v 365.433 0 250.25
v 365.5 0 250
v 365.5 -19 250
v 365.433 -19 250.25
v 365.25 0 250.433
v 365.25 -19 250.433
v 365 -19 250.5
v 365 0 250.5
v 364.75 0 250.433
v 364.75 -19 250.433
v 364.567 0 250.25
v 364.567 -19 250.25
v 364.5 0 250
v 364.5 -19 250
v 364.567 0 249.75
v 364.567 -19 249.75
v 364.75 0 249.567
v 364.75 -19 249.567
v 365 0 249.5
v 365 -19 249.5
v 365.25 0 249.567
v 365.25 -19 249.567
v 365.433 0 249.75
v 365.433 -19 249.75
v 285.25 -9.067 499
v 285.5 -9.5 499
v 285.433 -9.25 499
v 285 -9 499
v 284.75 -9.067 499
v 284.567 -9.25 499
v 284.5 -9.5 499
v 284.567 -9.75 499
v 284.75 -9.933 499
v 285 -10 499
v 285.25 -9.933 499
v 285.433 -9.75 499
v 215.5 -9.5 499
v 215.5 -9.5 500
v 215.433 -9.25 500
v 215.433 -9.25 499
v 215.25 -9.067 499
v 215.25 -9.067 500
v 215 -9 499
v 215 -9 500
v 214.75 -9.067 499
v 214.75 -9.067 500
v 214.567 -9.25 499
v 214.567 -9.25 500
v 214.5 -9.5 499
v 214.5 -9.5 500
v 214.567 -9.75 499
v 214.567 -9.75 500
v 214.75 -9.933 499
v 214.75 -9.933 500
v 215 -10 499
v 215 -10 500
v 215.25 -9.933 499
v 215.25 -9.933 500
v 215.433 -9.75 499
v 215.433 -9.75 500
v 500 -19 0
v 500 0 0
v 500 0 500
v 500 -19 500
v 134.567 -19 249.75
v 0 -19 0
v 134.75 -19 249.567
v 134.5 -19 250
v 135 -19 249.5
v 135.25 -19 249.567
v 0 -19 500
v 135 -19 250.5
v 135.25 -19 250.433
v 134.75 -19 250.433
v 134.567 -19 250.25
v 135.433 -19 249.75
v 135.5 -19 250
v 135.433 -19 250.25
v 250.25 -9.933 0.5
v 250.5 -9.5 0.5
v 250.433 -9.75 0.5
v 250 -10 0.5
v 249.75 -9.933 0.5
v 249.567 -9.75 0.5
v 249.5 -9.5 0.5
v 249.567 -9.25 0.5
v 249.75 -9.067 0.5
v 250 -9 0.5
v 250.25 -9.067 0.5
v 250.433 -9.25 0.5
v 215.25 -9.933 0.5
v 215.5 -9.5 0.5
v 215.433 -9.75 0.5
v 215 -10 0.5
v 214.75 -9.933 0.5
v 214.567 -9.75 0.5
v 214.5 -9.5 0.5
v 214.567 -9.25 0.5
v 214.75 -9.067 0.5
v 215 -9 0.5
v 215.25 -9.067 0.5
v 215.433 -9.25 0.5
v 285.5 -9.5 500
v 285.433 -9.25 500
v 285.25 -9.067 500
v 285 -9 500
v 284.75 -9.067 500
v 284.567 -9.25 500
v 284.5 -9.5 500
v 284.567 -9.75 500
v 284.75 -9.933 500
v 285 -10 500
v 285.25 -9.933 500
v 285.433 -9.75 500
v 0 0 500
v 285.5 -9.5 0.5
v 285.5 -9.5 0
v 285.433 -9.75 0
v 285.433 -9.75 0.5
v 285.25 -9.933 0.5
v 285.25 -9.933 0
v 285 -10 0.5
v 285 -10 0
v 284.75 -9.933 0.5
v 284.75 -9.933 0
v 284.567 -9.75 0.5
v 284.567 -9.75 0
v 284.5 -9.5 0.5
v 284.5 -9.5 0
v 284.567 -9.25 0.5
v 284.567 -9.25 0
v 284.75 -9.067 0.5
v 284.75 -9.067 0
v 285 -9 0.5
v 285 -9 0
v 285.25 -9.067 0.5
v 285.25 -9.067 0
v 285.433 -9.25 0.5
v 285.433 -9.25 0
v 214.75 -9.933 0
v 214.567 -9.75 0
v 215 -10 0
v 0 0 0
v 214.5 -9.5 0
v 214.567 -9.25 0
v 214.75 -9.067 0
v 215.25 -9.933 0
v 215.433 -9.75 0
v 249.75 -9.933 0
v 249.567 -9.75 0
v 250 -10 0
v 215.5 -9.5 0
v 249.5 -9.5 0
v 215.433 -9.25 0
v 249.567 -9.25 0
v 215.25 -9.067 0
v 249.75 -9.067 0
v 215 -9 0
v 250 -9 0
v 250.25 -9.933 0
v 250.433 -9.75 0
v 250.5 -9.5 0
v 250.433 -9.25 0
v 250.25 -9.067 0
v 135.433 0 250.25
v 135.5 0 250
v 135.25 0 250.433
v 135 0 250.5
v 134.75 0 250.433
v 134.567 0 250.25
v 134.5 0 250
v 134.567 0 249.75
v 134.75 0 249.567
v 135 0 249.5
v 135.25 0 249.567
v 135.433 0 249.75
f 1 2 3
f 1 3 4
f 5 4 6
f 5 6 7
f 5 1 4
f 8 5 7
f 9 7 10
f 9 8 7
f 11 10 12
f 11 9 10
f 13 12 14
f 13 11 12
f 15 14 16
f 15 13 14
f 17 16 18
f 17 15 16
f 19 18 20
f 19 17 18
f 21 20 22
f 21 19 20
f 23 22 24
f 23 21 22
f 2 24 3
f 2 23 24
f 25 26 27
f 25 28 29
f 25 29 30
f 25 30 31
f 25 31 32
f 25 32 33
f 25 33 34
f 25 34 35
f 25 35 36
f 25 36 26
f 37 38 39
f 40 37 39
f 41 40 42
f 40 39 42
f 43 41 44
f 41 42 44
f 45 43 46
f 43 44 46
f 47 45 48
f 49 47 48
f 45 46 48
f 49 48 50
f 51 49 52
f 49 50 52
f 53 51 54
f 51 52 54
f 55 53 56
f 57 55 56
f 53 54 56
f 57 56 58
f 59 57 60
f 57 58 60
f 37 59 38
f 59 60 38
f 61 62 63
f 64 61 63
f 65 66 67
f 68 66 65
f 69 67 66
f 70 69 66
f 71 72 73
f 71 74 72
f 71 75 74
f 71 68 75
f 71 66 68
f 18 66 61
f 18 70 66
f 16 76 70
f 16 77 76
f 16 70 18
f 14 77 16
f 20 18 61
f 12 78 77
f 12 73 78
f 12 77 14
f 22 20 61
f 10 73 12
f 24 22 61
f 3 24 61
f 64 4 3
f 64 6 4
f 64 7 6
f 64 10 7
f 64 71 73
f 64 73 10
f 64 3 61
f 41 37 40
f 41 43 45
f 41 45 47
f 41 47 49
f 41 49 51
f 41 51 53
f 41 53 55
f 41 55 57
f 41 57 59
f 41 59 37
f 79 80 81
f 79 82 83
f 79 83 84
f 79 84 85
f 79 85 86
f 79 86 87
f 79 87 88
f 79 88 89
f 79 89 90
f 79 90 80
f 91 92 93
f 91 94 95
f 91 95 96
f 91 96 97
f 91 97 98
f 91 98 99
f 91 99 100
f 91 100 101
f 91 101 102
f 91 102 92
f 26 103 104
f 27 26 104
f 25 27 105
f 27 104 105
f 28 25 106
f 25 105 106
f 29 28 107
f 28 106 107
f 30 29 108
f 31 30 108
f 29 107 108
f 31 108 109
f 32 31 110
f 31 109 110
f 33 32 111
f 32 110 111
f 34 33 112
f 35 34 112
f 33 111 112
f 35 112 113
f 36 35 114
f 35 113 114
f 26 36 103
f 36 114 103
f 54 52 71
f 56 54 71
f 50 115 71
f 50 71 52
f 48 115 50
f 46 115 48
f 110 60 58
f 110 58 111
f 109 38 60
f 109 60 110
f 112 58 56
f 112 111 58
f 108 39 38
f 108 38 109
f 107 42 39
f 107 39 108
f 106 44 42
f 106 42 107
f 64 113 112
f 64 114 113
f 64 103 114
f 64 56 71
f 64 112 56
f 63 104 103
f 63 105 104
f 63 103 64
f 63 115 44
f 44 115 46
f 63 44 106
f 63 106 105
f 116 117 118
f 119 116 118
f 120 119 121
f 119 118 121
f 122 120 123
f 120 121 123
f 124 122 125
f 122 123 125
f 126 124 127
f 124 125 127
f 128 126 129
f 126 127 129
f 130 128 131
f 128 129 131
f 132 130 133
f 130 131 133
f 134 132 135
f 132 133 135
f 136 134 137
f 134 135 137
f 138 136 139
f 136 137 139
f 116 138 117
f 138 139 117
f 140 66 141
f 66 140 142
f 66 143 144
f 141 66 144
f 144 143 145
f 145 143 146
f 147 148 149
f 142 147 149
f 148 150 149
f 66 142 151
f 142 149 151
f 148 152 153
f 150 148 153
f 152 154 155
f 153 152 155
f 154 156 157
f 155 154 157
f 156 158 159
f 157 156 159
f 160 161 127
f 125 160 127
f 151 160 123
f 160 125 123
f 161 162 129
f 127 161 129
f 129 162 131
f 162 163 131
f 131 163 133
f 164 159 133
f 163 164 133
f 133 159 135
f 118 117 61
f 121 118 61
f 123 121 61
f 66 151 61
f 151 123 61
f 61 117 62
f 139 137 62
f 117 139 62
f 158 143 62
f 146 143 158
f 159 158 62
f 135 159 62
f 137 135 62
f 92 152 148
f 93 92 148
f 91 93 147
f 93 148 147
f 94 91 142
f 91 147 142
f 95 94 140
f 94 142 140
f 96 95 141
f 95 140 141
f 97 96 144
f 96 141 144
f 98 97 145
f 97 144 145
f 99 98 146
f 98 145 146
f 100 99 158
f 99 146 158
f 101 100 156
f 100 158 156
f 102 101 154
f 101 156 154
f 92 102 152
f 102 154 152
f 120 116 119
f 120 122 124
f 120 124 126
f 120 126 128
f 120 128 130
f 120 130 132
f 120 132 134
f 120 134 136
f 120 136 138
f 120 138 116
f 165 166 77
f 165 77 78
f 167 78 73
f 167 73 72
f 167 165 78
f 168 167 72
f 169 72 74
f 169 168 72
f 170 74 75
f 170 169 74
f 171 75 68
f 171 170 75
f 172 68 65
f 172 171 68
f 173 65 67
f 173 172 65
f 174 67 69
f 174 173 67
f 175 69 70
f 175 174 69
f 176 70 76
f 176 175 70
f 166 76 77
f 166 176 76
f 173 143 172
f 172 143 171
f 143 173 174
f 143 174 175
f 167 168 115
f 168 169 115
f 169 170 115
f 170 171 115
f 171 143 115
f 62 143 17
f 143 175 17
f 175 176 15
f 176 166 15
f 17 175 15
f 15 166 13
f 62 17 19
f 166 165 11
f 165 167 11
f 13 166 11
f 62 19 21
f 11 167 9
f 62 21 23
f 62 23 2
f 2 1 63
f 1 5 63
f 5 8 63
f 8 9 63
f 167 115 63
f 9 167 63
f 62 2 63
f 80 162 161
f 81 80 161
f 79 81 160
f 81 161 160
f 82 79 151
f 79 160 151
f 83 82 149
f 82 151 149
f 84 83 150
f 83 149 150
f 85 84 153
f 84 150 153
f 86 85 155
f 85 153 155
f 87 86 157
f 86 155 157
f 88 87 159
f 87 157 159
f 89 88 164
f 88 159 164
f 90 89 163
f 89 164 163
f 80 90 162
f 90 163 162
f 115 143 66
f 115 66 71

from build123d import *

# Parameters (mm, degrees)
F0_W     = 500
F0_H     = 500
F0_R     = 0.5
F1_DEPTH = 19
F2_R     = 0.5
F3_DEPTH = 0.5
F4_R     = 0.5
F5_DEPTH = 1


with BuildPart() as f1:
    # F0 (on Front) → F1 (new body)
    with BuildSketch(Plane.XZ):
        with Locations((250, 250)):
            Rectangle(F0_W, F0_H)
        with Locations((135, 250)):
            Circle(F0_R, mode=Mode.SUBTRACT)
        with Locations((365, 250)):
            Circle(F0_R, mode=Mode.SUBTRACT)
    extrude(amount=F1_DEPTH)

    # F2 (on face) → F3 (cut, symmetric)
    with BuildSketch(Plane(origin=(0, 0, 0), x_dir=(1, 0, 0), z_dir=(0, 0, -1))):
        with Locations((250, 9.5)):
            Circle(F2_R)
        with Locations((215, 9.5)):
            Circle(F2_R)
        with Locations((285, 9.5)):
            Circle(F2_R)
    extrude(amount=F3_DEPTH, both=True, mode=Mode.SUBTRACT)

    # F4 (on face) → F5 (cut)
    with BuildSketch(Plane.XY.offset(500)):
        with Locations((215, -9.5)):
            Circle(F4_R)
        with Locations((285, -9.5)):
            Circle(F4_R)
    extrude(amount=-F5_DEPTH, mode=Mode.SUBTRACT)


solid = f1.part
